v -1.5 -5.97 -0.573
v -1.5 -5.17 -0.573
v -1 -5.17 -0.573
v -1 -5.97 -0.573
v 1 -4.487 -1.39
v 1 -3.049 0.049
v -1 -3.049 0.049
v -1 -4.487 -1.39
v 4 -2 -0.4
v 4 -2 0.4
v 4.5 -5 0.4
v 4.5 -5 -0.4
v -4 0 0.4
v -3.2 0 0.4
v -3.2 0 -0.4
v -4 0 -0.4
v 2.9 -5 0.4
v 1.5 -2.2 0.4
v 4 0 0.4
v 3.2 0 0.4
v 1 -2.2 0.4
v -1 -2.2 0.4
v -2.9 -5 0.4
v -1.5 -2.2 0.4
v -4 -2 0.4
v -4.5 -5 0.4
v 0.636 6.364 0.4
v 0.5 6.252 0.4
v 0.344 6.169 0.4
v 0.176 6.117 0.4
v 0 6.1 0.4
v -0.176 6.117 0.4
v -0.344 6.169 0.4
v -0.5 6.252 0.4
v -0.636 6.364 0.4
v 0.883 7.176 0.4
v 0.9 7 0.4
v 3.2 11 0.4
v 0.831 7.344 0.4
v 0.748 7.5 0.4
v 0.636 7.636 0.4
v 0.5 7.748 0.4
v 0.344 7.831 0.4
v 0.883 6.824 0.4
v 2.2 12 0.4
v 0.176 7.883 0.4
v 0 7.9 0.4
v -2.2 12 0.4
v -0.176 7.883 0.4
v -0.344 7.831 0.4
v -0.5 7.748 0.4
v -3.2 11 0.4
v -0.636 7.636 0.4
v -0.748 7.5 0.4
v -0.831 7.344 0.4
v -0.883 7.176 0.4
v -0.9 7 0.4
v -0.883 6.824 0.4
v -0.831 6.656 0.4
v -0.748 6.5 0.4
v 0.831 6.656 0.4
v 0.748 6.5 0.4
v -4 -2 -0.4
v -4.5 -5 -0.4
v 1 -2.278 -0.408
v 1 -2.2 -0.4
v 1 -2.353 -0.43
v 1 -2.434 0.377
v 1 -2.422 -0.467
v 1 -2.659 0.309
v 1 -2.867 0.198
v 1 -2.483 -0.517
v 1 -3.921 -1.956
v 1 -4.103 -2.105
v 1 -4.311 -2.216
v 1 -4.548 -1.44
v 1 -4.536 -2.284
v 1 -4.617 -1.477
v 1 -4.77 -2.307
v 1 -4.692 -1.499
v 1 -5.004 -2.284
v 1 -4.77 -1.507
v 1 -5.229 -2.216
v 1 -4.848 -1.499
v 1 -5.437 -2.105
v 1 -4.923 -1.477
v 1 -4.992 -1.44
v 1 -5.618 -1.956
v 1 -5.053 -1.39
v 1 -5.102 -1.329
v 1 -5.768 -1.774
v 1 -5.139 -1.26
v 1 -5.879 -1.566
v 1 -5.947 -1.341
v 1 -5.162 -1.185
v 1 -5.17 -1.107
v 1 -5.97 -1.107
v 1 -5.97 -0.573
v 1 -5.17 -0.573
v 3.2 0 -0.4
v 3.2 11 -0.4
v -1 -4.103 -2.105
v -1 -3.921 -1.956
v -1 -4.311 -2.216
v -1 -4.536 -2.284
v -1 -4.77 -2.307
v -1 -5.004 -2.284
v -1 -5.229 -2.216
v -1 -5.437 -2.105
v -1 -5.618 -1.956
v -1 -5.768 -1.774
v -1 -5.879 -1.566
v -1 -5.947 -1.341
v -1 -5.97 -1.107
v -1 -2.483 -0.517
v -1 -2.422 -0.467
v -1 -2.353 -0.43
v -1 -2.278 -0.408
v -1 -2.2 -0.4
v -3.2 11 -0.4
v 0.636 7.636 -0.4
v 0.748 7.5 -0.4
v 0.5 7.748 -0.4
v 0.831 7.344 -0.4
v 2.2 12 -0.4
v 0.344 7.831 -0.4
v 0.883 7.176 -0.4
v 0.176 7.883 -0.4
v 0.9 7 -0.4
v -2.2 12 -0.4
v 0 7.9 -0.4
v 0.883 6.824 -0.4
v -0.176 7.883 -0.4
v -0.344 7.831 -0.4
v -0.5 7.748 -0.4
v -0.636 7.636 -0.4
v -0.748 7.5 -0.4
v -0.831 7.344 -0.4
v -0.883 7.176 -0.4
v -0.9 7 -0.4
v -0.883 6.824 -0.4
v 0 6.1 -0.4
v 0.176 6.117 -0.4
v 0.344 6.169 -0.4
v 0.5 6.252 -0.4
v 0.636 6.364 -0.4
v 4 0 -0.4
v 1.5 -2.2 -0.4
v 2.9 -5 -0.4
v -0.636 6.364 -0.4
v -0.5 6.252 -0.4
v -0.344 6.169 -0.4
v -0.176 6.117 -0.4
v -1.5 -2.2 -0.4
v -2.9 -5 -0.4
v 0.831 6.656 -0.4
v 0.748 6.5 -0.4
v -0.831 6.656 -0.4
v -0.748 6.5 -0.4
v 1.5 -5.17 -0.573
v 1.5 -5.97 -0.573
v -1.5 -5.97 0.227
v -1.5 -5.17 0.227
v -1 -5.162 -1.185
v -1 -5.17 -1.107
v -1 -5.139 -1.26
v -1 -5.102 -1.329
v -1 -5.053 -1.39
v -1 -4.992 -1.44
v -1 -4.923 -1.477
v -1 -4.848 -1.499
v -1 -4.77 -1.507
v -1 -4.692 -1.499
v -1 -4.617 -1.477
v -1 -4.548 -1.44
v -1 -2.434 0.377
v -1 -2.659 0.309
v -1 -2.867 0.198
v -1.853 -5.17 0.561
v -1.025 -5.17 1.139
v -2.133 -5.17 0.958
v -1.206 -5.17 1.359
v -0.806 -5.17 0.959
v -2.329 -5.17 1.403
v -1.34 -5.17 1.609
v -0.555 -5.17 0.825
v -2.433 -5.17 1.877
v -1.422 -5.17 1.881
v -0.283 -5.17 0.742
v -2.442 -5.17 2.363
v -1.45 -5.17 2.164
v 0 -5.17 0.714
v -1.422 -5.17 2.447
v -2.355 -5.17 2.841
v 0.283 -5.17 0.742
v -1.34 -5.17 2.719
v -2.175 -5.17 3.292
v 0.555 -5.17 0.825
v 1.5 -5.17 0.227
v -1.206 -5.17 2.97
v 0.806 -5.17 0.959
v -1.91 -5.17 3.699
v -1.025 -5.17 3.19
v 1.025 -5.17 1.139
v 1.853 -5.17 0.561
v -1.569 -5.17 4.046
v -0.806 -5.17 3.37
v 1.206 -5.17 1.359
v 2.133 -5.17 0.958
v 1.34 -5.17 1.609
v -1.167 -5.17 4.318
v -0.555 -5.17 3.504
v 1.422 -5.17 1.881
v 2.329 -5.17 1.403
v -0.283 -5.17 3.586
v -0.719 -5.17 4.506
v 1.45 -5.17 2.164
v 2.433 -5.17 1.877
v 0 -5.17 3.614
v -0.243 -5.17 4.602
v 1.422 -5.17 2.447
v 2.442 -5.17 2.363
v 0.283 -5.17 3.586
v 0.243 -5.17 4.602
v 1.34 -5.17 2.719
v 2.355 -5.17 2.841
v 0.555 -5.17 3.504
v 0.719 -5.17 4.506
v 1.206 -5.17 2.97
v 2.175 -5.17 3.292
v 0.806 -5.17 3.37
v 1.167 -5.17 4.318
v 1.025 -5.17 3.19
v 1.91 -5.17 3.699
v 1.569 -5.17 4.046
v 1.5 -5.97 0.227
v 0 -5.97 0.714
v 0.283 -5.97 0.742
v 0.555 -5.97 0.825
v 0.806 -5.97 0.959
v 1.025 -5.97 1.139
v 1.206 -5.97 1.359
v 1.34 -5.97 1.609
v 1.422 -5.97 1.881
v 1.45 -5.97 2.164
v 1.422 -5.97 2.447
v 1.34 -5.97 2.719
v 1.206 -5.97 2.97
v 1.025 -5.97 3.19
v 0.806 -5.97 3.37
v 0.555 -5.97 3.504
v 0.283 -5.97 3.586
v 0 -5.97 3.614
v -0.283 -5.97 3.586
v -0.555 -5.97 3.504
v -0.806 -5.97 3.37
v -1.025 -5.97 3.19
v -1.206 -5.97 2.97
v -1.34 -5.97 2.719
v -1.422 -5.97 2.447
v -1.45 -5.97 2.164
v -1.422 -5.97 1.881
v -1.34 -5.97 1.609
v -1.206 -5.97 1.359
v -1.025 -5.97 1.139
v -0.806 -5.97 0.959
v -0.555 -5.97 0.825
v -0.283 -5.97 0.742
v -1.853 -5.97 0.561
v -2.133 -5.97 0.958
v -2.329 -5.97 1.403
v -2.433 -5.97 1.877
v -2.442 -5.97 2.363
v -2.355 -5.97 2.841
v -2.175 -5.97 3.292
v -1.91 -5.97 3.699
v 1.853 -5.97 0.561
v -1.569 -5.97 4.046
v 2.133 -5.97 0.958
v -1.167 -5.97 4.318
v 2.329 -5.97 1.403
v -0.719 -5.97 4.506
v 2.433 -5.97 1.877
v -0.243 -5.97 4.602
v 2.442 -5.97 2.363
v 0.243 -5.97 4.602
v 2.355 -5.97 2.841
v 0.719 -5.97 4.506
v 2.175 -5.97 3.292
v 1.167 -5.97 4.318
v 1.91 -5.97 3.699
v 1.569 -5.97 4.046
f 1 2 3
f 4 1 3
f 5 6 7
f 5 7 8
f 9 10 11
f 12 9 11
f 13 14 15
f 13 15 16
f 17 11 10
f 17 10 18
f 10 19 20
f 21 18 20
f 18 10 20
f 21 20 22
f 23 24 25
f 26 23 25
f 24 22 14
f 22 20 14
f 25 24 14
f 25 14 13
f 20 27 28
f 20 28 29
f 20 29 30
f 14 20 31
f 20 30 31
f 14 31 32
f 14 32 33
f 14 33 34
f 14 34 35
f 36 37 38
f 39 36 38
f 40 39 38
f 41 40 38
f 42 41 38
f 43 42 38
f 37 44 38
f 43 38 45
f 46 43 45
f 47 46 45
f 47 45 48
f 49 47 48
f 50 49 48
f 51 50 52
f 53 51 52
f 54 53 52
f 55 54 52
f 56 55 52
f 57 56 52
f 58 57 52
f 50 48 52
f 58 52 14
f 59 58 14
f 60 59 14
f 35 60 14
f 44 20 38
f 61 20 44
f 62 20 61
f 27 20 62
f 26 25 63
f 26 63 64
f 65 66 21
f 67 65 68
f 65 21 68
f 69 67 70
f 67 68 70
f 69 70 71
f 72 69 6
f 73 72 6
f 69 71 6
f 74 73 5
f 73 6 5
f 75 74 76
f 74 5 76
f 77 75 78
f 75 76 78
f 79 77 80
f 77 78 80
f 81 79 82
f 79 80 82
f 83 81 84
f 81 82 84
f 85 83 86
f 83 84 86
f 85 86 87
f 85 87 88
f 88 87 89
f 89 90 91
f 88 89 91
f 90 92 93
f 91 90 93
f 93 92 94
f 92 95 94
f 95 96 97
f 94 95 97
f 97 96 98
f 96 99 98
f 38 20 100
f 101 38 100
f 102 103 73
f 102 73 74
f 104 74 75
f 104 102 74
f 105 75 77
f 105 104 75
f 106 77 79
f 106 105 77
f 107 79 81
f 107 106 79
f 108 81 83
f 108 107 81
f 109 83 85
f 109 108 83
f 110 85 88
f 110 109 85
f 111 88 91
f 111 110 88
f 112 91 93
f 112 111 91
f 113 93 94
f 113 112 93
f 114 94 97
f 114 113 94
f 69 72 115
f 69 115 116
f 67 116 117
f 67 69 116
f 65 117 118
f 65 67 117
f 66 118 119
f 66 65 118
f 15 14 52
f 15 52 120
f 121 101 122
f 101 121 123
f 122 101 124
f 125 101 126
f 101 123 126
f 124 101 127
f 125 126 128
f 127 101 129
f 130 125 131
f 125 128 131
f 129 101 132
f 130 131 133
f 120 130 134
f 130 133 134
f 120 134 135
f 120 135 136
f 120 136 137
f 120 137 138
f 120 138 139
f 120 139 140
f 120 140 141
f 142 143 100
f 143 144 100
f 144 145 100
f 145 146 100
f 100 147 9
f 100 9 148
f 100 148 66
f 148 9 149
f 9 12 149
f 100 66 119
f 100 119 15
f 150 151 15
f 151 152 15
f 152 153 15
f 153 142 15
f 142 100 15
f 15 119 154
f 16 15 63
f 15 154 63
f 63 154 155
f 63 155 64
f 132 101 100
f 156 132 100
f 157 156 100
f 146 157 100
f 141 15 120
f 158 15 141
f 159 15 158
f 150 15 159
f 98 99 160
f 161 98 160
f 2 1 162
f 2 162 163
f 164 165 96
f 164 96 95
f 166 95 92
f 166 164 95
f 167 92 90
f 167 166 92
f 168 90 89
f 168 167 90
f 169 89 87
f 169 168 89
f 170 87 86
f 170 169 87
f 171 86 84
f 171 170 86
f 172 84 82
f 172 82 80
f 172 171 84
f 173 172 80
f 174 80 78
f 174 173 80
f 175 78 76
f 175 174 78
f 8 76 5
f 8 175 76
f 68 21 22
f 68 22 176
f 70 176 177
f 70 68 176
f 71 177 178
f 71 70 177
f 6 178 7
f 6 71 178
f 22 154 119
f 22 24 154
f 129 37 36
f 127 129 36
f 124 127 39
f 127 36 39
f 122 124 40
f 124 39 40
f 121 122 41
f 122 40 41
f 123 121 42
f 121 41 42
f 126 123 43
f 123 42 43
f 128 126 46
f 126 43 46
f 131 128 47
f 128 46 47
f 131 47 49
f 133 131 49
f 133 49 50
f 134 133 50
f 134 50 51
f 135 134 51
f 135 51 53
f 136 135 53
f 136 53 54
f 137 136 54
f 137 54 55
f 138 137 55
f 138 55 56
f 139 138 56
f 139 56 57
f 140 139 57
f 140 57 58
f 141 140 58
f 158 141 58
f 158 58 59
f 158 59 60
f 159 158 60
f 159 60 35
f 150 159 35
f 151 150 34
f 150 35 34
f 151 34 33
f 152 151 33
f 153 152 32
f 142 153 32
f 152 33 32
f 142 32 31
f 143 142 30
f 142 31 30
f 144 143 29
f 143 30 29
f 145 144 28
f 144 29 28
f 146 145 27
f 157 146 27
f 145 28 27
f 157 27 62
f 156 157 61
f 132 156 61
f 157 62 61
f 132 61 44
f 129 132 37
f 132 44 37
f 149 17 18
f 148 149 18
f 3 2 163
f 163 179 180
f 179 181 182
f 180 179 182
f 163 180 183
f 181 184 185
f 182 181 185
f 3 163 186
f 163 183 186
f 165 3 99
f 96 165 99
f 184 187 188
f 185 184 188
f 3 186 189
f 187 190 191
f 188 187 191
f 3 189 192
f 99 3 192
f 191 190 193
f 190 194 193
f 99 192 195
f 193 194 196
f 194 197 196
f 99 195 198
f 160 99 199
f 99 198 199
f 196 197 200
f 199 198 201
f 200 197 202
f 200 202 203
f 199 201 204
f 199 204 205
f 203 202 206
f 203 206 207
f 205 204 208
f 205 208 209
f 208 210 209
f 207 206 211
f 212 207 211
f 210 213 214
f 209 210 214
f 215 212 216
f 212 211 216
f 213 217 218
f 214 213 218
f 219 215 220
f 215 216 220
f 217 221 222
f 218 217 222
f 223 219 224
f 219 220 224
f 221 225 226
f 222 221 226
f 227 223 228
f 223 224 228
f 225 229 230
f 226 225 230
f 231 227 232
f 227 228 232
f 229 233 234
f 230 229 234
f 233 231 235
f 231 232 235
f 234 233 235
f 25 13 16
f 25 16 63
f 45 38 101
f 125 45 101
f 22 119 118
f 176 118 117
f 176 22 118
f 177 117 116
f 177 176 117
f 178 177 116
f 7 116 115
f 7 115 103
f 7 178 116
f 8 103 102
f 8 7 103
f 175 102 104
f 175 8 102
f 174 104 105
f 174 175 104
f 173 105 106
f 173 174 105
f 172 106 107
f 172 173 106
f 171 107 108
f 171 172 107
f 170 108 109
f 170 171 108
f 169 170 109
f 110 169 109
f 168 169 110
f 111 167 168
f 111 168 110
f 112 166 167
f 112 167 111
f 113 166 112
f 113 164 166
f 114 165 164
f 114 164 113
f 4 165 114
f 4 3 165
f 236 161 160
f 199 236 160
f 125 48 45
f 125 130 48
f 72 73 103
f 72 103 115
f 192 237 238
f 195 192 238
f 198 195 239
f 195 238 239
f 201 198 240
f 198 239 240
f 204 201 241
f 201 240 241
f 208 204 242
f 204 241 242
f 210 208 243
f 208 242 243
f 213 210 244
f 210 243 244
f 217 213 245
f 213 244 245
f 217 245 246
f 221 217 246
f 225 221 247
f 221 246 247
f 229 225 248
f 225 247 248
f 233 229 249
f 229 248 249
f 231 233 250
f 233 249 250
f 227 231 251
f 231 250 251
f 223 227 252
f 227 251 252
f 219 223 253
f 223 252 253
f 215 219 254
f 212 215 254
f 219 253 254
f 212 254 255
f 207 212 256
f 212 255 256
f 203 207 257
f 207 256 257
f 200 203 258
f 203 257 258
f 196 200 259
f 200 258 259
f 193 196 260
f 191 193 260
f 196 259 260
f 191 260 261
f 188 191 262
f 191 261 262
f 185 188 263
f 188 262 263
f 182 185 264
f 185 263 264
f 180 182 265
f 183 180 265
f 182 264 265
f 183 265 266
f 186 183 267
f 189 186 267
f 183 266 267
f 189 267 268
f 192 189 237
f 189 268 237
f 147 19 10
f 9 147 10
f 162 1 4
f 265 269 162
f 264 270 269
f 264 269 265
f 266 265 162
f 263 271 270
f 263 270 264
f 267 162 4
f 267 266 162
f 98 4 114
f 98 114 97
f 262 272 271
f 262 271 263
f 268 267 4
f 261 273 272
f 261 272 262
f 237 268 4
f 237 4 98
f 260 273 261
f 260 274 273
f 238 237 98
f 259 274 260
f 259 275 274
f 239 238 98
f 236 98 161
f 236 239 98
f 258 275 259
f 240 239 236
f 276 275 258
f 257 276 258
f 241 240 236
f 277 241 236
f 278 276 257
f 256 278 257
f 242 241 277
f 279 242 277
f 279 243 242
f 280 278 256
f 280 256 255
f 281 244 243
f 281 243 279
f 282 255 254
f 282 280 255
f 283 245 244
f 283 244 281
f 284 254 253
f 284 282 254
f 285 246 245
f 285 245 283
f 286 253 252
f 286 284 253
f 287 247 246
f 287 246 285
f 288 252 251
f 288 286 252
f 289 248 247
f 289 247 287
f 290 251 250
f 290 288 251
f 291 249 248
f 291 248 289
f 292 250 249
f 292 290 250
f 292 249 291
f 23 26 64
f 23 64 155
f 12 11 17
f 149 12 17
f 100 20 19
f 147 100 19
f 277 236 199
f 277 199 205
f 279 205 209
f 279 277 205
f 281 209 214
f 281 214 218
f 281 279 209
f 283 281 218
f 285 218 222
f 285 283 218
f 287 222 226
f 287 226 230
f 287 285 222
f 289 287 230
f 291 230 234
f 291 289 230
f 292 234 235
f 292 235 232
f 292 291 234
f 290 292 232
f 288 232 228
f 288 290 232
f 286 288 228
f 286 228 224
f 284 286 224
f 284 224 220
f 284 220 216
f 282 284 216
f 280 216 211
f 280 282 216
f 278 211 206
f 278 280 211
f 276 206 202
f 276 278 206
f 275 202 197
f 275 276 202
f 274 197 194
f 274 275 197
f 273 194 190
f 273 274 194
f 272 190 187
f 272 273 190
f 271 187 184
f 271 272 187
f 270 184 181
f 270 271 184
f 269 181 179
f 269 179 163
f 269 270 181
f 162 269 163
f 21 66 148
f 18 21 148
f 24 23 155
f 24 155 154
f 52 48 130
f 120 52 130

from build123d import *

# Parameters (mm, degrees)
MAINBODYS_W                           = 6.4
MAINBODYS_H                           = 0.8
MAIN_BODY_DEPTH                       = 12
BOTTOM_OF_MAIN_BODY_REACH             = 14.426
BOTTOM_OF_MAIN_BODY_DIRECTION_2_REACH = 14.426
TOPHOLES_R                            = 0.9
TOP_HOLE_DEPTH                        = 13.840950121
F_45_DEGREE_FLANGE_DEPTH              = 2
BOTTOM_FLAT_FLANGE_DEPTH              = 2
EXTENDEDBOTTOMFLANGES_W               = 3
EXTENDEDBOTTOMFLANGES_H               = 0.8
EXTENDED_BOTTOM_FLANGE_DEPTH          = 0.8
BOSSEDCYLINDERBODYS_R                 = 1.45
BOSSED_CYLINDER_BODY_DEPTH            = 0.8
C_MAIN_BODY_SIZE                      = 1


# Sheet-metal steps are written as plain solids
with BuildPart() as part:
    # MainBodyS → MAIN BODY (new body)
    with BuildSketch(Plane(origin=(0, 0, 0), x_dir=(1, 0, 0), z_dir=(0, 1, 0))):
        Rectangle(MAINBODYS_W, MAINBODYS_H)
    extrude(amount=MAIN_BODY_DEPTH)

    # BOTTOM OF MAIN BODY: up to this face of the body (flat: up to its plane)
    bottom_of_main_body_end = Plane(part.part.faces().sort_by_distance((0, 6, 0.4))[0])
    # BottomMainBodyS → BOTTOM OF MAIN BODY (add, up to the picked face)
    with BuildSketch(Plane.XY, mode=Mode.PRIVATE) as bottom_of_main_body_sk1:
        Polygon((0, 0), (4, 0), (4, -2), (4.5, -5), (2.9, -5), (1.5, -2.2), (0, -2.2), align=None)
    bottom_of_main_body_tool1 = split(extrude(bottom_of_main_body_sk1.sketch, amount=BOTTOM_OF_MAIN_BODY_REACH, mode=Mode.PRIVATE), bisect_by=bottom_of_main_body_end, keep=Keep.BOTH, mode=Mode.PRIVATE)
    bottom_of_main_body = bottom_of_main_body_tool1.solids().sort_by(Axis((2.475691, -2.049989, 0), (0, 0, 1)))[0]
    add(bottom_of_main_body)

    # BOTTOM OF MAIN BODY direction 2: up to this face of the body (flat: up to its plane)
    bottom_of_main_body_direction_2_end = Plane(part.part.faces().sort_by_distance((0, 6, -0.4))[0])
    # BottomMainBodyS → BOTTOM OF MAIN BODY direction 2 (add, up to the picked face)
    with BuildSketch(Plane.XY, mode=Mode.PRIVATE) as bottom_of_main_body_direction_2_sk1:
        Polygon((0, 0), (4, 0), (4, -2), (4.5, -5), (2.9, -5), (1.5, -2.2), (0, -2.2), align=None)
    bottom_of_main_body_direction_2_tool1 = split(extrude(bottom_of_main_body_direction_2_sk1.sketch, amount=-BOTTOM_OF_MAIN_BODY_DIRECTION_2_REACH, mode=Mode.PRIVATE), bisect_by=bottom_of_main_body_direction_2_end, keep=Keep.BOTH, mode=Mode.PRIVATE)
    bottom_of_main_body_direction_2 = bottom_of_main_body_direction_2_tool1.solids().sort_by(Axis((2.475691, -2.049989, 0), (0, 0, -1)))[0]
    add(bottom_of_main_body_direction_2)

    # BMB HM: BOTTOM OF MAIN BODY, BOTTOM OF MAIN BODY direction 2 across plane
    add(bottom_of_main_body.mirror(Plane(origin=(0, 0, 0), x_dir=(0, 0, 1), z_dir=(1, 0, 0))))
    add(bottom_of_main_body_direction_2.mirror(Plane(origin=(0, 0, 0), x_dir=(0, 0, 1), z_dir=(1, 0, 0))))

    # TopHoleS → TOP HOLE (cut, through all)
    with BuildSketch(Plane.XY.offset(0.4)):
        with Locations((0, 7)):
            Circle(TOPHOLES_R)
    extrude(amount=-TOP_HOLE_DEPTH, mode=Mode.SUBTRACT)

    # 45 DEGREE FLANGE section (across the edge) → 45 DEGREE FLANGE (add)
    with BuildSketch(Plane(origin=(1, -2.365685425, -0.4), x_dir=(0, 0.7071067811865438, -0.7071067811865512), z_dir=(-1, 0, 0))):
        with BuildLine():
            Line((-0.8, 0.165685425), (-0.8, 2.2))
            Line((-0.8, 2.2), (0, 2.2))
            Line((0, 2.2), (0, 0.165685425))
            ThreePointArc((0, 0.165685425), (0.030448187, 0.012612052), (0.117157288, -0.117157288))
            Line((0.117157288, -0.117157288), (-0.448528137, -0.682842712))
            ThreePointArc((-0.448528137, -0.682842712), (-0.708655439, -0.293534694), (-0.8, 0.165685425))
        make_face()
    extrude(amount=F_45_DEGREE_FLANGE_DEPTH)

    # BOTTOM FLAT FLANGE section (across the edge) → BOTTOM FLAT FLANGE (add)
    with BuildSketch(Plane(origin=(-1, -5.169848481, -2.072792206), x_dir=(0, 1, 0), z_dir=(1, 0, 0))):
        with BuildLine():
            Line((-0.8, 0.965685425), (-0.8, 1.5))
            Line((-0.8, 1.5), (0, 1.5))
            Line((0, 1.5), (0, 0.965685425))
            ThreePointArc((0, 0.965685425), (0.246926627, 0.596133612), (0.682842712, 0.682842712))
            Line((0.682842712, 0.682842712), (1.248528137, 0.117157288))
            ThreePointArc((1.248528137, 0.117157288), (-0.059220119, -0.142970014), (-0.8, 0.965685425))
        make_face()
    extrude(amount=BOTTOM_FLAT_FLANGE_DEPTH)

    # ExtendedBottomFlangeS → EXTENDED BOTTOM FLANGE (add)
    with BuildSketch(Plane.XY.offset(-0.572792206)):
        with Locations((0, -5.569848481)):
            Rectangle(EXTENDEDBOTTOMFLANGES_W, EXTENDEDBOTTOMFLANGES_H)
    extrude(amount=EXTENDED_BOTTOM_FLANGE_DEPTH)

    # BossedCylinderBodyS → BOSSED  CYLINDER BODY (add)
    with BuildSketch(Plane.XZ.offset(5.969848481)):
        with BuildLine():
            Line((-1.5, 0.227207794), (1.5, 0.227207794))
            ThreePointArc((1.5, 0.227207794), (0, 4.614344857), (-1.5, 0.227207794))
        make_face()
        with Locations(Location((0, 2.164344857, 0), (0, 0, 270))):
            Circle(BOSSEDCYLINDERBODYS_R, mode=Mode.SUBTRACT)
    extrude(amount=-BOSSED_CYLINDER_BODY_DEPTH)

    # C MAIN BODY
    c_main_body_edges = [part.edges().sort_by_distance(p)[0] for p in [
        (-3.2, 12, 0),
        (3.2, 12, 0),
    ]]
    chamfer(c_main_body_edges, length=C_MAIN_BODY_SIZE)


solid = part.part
